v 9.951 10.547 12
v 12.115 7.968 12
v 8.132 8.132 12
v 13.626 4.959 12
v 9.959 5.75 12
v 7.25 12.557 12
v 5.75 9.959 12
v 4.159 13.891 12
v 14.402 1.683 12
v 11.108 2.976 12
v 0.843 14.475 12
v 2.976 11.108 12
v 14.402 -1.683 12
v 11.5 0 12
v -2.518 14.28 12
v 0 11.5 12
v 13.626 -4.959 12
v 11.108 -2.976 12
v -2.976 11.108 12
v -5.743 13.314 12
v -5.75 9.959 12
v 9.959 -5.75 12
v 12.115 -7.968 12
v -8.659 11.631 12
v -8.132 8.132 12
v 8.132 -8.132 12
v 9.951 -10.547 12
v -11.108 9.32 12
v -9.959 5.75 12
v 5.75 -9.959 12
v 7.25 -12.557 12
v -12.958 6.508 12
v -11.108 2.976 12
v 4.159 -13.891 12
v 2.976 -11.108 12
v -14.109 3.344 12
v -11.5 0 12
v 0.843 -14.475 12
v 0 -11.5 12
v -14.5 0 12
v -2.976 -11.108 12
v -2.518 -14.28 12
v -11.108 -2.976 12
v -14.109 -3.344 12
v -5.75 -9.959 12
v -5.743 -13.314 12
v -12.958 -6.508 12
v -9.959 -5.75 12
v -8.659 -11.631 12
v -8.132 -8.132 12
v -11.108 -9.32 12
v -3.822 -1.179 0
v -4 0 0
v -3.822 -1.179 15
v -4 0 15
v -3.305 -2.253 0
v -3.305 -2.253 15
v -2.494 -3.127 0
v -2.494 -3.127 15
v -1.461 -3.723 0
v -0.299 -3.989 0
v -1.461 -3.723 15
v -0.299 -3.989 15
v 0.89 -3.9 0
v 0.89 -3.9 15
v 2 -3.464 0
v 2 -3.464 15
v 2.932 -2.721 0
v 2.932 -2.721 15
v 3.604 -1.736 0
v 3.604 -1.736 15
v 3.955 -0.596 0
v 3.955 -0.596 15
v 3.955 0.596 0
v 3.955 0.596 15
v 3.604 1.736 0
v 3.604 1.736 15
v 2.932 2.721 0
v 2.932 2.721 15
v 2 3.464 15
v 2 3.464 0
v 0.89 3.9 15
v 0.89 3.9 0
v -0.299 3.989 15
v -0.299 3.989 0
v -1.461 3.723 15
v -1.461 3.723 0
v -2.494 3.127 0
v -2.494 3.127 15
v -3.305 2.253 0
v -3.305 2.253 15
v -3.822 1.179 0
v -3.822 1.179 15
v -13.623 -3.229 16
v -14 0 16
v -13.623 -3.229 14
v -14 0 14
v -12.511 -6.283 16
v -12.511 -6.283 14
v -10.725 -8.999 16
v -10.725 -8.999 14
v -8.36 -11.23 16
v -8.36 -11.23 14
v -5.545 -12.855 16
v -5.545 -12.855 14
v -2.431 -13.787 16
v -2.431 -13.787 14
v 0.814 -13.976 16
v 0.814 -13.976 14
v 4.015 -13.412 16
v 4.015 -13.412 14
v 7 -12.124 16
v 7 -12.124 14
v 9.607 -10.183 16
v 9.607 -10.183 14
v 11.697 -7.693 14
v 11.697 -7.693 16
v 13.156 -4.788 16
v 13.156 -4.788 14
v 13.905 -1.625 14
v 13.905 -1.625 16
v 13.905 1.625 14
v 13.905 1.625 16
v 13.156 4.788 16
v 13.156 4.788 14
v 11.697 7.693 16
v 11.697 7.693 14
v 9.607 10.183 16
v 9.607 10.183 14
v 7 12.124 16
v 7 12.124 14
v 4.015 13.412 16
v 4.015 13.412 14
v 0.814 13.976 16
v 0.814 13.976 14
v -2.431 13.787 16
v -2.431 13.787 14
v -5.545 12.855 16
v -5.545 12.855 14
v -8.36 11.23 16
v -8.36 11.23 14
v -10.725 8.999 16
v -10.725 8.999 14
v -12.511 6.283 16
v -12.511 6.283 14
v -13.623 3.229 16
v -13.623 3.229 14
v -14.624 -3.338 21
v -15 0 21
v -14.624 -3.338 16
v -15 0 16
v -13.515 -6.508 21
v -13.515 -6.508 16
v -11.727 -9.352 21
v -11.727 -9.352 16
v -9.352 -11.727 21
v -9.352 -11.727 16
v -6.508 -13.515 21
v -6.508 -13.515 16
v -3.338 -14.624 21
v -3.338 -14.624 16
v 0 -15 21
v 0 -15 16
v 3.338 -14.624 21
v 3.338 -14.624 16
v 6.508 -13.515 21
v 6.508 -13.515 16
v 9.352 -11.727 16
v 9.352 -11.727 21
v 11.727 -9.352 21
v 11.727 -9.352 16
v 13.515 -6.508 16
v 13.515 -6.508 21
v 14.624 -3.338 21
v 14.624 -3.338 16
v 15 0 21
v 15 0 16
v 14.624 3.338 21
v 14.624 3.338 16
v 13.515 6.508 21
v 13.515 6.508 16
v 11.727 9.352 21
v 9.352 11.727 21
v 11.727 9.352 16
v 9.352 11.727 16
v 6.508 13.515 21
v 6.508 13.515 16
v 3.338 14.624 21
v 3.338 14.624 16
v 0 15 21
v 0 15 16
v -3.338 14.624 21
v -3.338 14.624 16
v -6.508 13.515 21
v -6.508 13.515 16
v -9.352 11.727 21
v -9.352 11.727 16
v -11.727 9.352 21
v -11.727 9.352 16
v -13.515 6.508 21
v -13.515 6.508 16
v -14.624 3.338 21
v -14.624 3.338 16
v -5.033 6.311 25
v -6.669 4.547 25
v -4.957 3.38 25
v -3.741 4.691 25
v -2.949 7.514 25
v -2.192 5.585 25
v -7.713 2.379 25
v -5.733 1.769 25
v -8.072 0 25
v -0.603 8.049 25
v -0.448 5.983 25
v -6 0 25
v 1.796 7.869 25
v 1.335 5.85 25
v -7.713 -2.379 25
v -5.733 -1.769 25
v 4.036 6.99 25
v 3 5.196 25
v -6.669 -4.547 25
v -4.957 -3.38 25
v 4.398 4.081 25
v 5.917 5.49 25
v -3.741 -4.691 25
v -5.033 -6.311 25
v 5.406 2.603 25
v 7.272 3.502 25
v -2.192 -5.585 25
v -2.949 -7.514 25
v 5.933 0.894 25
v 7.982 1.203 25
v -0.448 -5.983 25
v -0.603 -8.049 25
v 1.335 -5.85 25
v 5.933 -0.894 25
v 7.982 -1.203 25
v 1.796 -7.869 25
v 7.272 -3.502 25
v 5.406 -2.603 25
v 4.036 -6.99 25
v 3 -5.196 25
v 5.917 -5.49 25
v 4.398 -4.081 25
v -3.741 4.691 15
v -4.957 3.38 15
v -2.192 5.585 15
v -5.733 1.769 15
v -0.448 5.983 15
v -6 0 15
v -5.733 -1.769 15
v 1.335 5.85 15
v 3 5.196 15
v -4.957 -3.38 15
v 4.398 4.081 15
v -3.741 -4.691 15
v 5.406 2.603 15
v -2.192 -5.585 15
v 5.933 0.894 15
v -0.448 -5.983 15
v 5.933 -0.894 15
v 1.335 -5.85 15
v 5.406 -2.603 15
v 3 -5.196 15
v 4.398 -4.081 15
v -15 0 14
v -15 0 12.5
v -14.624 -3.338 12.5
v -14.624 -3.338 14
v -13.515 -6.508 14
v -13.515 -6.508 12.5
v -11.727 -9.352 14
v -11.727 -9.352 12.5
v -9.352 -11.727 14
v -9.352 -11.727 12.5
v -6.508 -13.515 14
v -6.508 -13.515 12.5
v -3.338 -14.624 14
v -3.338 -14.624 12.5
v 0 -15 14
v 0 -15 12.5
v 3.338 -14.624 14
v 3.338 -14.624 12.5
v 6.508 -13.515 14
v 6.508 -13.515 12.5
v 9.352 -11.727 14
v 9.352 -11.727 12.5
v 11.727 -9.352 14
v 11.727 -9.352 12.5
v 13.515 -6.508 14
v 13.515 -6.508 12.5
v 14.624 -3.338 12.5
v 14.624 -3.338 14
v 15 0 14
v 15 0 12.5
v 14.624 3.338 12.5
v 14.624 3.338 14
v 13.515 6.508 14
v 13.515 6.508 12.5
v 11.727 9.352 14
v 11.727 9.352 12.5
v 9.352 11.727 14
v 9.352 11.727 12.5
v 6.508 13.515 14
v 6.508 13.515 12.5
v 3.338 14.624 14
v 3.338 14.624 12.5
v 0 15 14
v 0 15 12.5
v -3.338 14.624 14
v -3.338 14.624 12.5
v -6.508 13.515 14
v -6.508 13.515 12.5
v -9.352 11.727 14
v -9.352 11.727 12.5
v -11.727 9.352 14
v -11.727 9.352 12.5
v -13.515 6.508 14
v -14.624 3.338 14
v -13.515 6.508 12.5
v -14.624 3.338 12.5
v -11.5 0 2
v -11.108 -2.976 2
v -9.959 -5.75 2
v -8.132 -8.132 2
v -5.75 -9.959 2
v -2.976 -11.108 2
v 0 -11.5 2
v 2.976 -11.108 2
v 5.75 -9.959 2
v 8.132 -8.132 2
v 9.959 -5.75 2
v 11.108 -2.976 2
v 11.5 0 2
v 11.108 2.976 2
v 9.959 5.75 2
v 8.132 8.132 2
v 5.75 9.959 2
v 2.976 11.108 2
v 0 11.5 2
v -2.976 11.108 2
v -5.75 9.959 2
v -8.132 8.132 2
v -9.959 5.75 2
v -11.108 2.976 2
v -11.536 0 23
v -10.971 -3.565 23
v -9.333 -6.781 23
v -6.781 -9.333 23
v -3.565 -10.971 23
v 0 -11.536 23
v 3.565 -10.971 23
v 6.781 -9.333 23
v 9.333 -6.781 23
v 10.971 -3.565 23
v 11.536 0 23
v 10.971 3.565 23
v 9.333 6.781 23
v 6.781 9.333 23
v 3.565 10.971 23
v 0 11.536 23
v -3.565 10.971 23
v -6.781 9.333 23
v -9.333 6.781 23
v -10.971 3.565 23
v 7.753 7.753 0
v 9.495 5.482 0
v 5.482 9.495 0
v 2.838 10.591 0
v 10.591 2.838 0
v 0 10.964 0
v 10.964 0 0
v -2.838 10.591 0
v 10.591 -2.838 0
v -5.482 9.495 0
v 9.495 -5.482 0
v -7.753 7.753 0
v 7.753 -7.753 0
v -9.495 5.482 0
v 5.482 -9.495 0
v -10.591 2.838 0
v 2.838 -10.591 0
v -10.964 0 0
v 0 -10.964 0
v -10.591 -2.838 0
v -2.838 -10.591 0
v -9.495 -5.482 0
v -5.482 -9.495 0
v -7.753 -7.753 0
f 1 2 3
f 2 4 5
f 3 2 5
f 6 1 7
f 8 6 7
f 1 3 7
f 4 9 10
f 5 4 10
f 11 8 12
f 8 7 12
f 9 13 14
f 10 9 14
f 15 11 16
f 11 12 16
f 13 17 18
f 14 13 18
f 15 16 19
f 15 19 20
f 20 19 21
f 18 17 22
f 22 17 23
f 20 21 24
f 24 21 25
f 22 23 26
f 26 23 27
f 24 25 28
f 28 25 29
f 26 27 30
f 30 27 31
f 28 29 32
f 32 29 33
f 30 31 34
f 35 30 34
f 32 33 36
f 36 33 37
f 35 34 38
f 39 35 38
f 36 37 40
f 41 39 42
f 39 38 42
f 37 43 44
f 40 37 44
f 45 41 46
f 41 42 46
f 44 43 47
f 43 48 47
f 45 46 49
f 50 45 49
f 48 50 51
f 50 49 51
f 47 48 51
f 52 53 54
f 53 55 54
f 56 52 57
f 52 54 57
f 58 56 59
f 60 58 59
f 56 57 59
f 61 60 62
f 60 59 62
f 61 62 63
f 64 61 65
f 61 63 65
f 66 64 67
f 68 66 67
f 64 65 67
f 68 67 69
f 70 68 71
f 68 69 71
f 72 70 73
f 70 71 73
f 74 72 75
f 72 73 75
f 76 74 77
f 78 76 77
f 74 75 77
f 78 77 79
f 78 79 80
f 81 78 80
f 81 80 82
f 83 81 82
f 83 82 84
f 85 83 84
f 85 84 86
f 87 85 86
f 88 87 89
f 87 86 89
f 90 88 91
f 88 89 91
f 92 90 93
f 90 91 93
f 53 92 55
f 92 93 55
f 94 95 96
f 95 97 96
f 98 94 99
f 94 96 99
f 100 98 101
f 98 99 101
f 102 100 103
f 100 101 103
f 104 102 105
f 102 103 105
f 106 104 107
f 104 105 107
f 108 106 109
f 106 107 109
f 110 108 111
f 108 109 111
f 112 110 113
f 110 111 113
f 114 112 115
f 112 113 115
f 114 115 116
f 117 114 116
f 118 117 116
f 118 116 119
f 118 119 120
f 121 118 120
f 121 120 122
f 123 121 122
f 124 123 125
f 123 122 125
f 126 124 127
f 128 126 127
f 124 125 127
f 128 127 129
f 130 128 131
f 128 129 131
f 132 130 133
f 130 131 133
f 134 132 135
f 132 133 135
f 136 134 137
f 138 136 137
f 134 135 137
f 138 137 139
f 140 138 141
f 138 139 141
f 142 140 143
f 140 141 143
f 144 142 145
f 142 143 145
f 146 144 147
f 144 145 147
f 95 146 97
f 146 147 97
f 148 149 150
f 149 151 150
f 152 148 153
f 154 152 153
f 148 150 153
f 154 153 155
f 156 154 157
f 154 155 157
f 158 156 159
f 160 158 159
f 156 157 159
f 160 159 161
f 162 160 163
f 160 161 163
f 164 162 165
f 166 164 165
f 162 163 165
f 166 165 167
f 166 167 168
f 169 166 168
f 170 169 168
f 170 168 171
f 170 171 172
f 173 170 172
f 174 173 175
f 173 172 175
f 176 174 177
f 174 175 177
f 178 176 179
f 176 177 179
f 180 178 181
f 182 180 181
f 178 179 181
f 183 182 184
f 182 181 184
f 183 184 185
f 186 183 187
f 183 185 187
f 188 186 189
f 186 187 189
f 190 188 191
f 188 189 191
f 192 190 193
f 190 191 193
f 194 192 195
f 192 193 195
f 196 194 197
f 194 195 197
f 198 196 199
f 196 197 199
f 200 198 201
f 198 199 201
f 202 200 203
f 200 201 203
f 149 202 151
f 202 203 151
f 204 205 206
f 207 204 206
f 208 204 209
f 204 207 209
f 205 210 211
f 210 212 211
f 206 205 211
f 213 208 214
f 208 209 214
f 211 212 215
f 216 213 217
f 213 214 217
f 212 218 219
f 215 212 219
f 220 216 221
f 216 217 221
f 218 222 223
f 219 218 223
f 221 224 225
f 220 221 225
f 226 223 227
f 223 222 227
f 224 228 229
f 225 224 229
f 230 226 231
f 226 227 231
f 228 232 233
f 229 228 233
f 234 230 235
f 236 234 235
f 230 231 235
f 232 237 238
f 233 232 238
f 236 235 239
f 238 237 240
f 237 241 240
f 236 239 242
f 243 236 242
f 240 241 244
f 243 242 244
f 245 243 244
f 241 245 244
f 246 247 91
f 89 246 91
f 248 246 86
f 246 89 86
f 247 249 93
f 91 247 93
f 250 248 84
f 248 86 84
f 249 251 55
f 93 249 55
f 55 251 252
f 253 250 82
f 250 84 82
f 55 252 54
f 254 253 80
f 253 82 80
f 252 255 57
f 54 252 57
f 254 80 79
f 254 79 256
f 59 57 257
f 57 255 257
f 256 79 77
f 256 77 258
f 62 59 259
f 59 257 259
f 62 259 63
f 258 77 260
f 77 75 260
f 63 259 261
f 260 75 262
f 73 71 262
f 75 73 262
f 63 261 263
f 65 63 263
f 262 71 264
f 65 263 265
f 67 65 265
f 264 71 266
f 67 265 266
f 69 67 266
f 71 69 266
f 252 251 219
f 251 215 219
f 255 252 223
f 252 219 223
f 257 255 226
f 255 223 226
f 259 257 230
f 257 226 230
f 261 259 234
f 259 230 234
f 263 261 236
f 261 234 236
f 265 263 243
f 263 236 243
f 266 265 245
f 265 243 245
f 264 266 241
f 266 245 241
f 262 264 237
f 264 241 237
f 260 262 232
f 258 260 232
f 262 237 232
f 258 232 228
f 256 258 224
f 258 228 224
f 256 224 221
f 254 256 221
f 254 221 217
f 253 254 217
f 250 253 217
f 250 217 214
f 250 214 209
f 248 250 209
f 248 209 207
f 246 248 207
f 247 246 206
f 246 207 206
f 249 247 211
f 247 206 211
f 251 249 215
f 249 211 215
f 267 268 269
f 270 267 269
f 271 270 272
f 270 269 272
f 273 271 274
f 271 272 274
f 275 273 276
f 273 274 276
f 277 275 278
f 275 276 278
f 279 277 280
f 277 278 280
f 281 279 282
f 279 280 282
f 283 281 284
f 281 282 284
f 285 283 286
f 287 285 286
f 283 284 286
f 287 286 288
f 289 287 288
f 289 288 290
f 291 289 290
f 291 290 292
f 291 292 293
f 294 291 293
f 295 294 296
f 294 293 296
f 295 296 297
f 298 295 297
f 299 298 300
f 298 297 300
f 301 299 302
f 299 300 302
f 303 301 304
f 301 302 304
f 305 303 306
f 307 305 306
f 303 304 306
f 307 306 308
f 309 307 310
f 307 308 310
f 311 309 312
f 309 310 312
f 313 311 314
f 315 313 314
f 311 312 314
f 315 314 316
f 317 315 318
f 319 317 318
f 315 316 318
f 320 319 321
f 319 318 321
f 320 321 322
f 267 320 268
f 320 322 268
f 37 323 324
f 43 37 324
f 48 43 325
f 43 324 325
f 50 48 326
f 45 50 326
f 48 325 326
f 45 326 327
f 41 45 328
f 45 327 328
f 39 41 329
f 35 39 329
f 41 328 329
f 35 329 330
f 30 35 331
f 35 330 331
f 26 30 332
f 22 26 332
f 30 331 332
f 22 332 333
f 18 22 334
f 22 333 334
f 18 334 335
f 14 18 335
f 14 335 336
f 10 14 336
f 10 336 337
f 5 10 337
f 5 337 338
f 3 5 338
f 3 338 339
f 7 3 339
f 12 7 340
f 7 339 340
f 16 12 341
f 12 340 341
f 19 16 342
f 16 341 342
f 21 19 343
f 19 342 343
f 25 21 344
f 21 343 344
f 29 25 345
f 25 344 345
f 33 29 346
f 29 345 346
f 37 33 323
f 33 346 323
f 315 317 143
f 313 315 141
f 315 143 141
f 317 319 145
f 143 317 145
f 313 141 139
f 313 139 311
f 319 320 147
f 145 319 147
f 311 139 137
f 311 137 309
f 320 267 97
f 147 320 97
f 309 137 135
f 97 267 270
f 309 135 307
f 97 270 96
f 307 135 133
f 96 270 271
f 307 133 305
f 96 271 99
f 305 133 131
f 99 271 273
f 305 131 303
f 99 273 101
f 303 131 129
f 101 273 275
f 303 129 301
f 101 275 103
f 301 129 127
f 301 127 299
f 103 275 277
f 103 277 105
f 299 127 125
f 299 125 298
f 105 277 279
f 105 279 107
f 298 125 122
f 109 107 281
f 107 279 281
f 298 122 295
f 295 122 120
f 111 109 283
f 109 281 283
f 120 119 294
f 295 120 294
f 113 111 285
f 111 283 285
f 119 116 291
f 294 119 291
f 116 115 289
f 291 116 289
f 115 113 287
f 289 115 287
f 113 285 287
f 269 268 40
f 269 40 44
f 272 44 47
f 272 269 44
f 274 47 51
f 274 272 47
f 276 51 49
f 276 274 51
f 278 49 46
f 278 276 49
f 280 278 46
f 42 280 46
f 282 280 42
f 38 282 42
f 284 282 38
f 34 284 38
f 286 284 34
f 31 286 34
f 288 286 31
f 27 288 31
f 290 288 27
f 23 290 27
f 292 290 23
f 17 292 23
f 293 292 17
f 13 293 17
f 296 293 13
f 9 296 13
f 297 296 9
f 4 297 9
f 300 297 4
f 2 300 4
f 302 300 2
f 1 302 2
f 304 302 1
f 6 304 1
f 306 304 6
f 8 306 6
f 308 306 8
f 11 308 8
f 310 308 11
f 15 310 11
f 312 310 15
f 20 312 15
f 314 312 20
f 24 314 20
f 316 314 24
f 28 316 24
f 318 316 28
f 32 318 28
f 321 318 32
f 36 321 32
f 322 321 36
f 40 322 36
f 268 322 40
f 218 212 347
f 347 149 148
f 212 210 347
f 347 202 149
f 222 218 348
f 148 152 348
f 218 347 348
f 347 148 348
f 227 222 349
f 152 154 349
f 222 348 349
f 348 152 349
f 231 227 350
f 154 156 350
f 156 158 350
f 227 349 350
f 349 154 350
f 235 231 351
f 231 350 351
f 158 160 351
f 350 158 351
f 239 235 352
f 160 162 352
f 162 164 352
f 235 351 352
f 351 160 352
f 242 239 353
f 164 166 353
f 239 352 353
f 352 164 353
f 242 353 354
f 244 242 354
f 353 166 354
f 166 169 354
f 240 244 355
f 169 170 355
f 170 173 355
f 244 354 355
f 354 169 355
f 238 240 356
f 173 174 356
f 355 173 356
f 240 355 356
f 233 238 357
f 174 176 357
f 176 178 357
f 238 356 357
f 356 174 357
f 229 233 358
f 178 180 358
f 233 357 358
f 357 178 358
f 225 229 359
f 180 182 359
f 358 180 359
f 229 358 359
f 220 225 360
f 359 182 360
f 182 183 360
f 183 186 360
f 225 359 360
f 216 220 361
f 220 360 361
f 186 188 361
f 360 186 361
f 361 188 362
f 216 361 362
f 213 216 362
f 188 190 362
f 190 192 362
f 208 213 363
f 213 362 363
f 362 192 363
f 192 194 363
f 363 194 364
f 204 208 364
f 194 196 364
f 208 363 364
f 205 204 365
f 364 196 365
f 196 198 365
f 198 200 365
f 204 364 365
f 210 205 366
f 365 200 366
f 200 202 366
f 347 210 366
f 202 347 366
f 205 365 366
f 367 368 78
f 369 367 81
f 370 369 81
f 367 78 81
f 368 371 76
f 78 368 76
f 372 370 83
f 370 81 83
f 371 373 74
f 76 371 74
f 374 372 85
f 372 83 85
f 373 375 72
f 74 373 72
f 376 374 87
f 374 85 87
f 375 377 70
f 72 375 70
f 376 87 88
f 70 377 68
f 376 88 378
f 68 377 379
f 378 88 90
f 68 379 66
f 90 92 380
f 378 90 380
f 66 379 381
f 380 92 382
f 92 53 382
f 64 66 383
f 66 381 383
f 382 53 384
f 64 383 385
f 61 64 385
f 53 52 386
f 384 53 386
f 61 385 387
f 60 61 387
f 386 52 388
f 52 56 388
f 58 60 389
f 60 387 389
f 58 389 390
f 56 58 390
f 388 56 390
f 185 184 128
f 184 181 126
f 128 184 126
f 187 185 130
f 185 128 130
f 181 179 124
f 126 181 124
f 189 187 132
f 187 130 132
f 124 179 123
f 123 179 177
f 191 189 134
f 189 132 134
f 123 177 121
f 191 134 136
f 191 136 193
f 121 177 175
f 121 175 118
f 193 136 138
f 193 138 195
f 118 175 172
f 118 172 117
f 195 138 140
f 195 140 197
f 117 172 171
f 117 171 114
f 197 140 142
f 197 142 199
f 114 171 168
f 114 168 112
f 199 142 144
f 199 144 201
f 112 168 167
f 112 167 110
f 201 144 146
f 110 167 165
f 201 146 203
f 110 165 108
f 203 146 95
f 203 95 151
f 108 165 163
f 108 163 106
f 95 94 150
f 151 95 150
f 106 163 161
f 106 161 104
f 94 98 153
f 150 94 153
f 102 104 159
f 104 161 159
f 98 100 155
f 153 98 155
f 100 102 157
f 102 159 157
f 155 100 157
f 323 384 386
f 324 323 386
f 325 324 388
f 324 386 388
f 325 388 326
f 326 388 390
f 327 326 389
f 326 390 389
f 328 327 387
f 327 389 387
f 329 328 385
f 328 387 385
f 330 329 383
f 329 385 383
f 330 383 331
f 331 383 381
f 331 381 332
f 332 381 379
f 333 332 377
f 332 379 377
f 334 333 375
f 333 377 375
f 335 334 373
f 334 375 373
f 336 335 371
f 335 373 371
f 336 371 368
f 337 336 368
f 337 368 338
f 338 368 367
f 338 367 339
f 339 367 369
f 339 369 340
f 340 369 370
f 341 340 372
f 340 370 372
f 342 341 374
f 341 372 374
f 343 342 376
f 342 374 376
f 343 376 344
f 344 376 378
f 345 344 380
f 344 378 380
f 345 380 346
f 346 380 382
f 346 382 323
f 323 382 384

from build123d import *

# Parameters (mm, degrees)
F2_SIZE2 = 0.535898
F2_SIZE  = 2
F3_SIZE  = 0.5


with BuildPart() as f1:
    # F0 (on Front) → F1 (revolve)
    with BuildSketch(Plane.XZ):
        Polygon((-6, 15), (-6, 25), (-8.071797, 25), (-15, 21), (-15, 16), (-14, 16), (-14, 14), (-15, 14), (-15, 12), (-11.5, 12), (-11.5, 0), (-4, 0), (-4, 15), align=None)
    revolve(axis=Axis((0, 0, 15.110009), (0, 0, 1)))

    # F2
    f2_edges = [f1.edges().sort_by_distance(p)[0] for p in [
        (11.5, 0, 0),
    ]]
    chamfer(f2_edges, length=F2_SIZE, length2=F2_SIZE2)

    # F3
    f3_edges = [f1.edges().sort_by_distance(p)[0] for p in [
        (15, 0, 12),
    ]]
    chamfer(f3_edges, length=F3_SIZE)


solid = f1.part
